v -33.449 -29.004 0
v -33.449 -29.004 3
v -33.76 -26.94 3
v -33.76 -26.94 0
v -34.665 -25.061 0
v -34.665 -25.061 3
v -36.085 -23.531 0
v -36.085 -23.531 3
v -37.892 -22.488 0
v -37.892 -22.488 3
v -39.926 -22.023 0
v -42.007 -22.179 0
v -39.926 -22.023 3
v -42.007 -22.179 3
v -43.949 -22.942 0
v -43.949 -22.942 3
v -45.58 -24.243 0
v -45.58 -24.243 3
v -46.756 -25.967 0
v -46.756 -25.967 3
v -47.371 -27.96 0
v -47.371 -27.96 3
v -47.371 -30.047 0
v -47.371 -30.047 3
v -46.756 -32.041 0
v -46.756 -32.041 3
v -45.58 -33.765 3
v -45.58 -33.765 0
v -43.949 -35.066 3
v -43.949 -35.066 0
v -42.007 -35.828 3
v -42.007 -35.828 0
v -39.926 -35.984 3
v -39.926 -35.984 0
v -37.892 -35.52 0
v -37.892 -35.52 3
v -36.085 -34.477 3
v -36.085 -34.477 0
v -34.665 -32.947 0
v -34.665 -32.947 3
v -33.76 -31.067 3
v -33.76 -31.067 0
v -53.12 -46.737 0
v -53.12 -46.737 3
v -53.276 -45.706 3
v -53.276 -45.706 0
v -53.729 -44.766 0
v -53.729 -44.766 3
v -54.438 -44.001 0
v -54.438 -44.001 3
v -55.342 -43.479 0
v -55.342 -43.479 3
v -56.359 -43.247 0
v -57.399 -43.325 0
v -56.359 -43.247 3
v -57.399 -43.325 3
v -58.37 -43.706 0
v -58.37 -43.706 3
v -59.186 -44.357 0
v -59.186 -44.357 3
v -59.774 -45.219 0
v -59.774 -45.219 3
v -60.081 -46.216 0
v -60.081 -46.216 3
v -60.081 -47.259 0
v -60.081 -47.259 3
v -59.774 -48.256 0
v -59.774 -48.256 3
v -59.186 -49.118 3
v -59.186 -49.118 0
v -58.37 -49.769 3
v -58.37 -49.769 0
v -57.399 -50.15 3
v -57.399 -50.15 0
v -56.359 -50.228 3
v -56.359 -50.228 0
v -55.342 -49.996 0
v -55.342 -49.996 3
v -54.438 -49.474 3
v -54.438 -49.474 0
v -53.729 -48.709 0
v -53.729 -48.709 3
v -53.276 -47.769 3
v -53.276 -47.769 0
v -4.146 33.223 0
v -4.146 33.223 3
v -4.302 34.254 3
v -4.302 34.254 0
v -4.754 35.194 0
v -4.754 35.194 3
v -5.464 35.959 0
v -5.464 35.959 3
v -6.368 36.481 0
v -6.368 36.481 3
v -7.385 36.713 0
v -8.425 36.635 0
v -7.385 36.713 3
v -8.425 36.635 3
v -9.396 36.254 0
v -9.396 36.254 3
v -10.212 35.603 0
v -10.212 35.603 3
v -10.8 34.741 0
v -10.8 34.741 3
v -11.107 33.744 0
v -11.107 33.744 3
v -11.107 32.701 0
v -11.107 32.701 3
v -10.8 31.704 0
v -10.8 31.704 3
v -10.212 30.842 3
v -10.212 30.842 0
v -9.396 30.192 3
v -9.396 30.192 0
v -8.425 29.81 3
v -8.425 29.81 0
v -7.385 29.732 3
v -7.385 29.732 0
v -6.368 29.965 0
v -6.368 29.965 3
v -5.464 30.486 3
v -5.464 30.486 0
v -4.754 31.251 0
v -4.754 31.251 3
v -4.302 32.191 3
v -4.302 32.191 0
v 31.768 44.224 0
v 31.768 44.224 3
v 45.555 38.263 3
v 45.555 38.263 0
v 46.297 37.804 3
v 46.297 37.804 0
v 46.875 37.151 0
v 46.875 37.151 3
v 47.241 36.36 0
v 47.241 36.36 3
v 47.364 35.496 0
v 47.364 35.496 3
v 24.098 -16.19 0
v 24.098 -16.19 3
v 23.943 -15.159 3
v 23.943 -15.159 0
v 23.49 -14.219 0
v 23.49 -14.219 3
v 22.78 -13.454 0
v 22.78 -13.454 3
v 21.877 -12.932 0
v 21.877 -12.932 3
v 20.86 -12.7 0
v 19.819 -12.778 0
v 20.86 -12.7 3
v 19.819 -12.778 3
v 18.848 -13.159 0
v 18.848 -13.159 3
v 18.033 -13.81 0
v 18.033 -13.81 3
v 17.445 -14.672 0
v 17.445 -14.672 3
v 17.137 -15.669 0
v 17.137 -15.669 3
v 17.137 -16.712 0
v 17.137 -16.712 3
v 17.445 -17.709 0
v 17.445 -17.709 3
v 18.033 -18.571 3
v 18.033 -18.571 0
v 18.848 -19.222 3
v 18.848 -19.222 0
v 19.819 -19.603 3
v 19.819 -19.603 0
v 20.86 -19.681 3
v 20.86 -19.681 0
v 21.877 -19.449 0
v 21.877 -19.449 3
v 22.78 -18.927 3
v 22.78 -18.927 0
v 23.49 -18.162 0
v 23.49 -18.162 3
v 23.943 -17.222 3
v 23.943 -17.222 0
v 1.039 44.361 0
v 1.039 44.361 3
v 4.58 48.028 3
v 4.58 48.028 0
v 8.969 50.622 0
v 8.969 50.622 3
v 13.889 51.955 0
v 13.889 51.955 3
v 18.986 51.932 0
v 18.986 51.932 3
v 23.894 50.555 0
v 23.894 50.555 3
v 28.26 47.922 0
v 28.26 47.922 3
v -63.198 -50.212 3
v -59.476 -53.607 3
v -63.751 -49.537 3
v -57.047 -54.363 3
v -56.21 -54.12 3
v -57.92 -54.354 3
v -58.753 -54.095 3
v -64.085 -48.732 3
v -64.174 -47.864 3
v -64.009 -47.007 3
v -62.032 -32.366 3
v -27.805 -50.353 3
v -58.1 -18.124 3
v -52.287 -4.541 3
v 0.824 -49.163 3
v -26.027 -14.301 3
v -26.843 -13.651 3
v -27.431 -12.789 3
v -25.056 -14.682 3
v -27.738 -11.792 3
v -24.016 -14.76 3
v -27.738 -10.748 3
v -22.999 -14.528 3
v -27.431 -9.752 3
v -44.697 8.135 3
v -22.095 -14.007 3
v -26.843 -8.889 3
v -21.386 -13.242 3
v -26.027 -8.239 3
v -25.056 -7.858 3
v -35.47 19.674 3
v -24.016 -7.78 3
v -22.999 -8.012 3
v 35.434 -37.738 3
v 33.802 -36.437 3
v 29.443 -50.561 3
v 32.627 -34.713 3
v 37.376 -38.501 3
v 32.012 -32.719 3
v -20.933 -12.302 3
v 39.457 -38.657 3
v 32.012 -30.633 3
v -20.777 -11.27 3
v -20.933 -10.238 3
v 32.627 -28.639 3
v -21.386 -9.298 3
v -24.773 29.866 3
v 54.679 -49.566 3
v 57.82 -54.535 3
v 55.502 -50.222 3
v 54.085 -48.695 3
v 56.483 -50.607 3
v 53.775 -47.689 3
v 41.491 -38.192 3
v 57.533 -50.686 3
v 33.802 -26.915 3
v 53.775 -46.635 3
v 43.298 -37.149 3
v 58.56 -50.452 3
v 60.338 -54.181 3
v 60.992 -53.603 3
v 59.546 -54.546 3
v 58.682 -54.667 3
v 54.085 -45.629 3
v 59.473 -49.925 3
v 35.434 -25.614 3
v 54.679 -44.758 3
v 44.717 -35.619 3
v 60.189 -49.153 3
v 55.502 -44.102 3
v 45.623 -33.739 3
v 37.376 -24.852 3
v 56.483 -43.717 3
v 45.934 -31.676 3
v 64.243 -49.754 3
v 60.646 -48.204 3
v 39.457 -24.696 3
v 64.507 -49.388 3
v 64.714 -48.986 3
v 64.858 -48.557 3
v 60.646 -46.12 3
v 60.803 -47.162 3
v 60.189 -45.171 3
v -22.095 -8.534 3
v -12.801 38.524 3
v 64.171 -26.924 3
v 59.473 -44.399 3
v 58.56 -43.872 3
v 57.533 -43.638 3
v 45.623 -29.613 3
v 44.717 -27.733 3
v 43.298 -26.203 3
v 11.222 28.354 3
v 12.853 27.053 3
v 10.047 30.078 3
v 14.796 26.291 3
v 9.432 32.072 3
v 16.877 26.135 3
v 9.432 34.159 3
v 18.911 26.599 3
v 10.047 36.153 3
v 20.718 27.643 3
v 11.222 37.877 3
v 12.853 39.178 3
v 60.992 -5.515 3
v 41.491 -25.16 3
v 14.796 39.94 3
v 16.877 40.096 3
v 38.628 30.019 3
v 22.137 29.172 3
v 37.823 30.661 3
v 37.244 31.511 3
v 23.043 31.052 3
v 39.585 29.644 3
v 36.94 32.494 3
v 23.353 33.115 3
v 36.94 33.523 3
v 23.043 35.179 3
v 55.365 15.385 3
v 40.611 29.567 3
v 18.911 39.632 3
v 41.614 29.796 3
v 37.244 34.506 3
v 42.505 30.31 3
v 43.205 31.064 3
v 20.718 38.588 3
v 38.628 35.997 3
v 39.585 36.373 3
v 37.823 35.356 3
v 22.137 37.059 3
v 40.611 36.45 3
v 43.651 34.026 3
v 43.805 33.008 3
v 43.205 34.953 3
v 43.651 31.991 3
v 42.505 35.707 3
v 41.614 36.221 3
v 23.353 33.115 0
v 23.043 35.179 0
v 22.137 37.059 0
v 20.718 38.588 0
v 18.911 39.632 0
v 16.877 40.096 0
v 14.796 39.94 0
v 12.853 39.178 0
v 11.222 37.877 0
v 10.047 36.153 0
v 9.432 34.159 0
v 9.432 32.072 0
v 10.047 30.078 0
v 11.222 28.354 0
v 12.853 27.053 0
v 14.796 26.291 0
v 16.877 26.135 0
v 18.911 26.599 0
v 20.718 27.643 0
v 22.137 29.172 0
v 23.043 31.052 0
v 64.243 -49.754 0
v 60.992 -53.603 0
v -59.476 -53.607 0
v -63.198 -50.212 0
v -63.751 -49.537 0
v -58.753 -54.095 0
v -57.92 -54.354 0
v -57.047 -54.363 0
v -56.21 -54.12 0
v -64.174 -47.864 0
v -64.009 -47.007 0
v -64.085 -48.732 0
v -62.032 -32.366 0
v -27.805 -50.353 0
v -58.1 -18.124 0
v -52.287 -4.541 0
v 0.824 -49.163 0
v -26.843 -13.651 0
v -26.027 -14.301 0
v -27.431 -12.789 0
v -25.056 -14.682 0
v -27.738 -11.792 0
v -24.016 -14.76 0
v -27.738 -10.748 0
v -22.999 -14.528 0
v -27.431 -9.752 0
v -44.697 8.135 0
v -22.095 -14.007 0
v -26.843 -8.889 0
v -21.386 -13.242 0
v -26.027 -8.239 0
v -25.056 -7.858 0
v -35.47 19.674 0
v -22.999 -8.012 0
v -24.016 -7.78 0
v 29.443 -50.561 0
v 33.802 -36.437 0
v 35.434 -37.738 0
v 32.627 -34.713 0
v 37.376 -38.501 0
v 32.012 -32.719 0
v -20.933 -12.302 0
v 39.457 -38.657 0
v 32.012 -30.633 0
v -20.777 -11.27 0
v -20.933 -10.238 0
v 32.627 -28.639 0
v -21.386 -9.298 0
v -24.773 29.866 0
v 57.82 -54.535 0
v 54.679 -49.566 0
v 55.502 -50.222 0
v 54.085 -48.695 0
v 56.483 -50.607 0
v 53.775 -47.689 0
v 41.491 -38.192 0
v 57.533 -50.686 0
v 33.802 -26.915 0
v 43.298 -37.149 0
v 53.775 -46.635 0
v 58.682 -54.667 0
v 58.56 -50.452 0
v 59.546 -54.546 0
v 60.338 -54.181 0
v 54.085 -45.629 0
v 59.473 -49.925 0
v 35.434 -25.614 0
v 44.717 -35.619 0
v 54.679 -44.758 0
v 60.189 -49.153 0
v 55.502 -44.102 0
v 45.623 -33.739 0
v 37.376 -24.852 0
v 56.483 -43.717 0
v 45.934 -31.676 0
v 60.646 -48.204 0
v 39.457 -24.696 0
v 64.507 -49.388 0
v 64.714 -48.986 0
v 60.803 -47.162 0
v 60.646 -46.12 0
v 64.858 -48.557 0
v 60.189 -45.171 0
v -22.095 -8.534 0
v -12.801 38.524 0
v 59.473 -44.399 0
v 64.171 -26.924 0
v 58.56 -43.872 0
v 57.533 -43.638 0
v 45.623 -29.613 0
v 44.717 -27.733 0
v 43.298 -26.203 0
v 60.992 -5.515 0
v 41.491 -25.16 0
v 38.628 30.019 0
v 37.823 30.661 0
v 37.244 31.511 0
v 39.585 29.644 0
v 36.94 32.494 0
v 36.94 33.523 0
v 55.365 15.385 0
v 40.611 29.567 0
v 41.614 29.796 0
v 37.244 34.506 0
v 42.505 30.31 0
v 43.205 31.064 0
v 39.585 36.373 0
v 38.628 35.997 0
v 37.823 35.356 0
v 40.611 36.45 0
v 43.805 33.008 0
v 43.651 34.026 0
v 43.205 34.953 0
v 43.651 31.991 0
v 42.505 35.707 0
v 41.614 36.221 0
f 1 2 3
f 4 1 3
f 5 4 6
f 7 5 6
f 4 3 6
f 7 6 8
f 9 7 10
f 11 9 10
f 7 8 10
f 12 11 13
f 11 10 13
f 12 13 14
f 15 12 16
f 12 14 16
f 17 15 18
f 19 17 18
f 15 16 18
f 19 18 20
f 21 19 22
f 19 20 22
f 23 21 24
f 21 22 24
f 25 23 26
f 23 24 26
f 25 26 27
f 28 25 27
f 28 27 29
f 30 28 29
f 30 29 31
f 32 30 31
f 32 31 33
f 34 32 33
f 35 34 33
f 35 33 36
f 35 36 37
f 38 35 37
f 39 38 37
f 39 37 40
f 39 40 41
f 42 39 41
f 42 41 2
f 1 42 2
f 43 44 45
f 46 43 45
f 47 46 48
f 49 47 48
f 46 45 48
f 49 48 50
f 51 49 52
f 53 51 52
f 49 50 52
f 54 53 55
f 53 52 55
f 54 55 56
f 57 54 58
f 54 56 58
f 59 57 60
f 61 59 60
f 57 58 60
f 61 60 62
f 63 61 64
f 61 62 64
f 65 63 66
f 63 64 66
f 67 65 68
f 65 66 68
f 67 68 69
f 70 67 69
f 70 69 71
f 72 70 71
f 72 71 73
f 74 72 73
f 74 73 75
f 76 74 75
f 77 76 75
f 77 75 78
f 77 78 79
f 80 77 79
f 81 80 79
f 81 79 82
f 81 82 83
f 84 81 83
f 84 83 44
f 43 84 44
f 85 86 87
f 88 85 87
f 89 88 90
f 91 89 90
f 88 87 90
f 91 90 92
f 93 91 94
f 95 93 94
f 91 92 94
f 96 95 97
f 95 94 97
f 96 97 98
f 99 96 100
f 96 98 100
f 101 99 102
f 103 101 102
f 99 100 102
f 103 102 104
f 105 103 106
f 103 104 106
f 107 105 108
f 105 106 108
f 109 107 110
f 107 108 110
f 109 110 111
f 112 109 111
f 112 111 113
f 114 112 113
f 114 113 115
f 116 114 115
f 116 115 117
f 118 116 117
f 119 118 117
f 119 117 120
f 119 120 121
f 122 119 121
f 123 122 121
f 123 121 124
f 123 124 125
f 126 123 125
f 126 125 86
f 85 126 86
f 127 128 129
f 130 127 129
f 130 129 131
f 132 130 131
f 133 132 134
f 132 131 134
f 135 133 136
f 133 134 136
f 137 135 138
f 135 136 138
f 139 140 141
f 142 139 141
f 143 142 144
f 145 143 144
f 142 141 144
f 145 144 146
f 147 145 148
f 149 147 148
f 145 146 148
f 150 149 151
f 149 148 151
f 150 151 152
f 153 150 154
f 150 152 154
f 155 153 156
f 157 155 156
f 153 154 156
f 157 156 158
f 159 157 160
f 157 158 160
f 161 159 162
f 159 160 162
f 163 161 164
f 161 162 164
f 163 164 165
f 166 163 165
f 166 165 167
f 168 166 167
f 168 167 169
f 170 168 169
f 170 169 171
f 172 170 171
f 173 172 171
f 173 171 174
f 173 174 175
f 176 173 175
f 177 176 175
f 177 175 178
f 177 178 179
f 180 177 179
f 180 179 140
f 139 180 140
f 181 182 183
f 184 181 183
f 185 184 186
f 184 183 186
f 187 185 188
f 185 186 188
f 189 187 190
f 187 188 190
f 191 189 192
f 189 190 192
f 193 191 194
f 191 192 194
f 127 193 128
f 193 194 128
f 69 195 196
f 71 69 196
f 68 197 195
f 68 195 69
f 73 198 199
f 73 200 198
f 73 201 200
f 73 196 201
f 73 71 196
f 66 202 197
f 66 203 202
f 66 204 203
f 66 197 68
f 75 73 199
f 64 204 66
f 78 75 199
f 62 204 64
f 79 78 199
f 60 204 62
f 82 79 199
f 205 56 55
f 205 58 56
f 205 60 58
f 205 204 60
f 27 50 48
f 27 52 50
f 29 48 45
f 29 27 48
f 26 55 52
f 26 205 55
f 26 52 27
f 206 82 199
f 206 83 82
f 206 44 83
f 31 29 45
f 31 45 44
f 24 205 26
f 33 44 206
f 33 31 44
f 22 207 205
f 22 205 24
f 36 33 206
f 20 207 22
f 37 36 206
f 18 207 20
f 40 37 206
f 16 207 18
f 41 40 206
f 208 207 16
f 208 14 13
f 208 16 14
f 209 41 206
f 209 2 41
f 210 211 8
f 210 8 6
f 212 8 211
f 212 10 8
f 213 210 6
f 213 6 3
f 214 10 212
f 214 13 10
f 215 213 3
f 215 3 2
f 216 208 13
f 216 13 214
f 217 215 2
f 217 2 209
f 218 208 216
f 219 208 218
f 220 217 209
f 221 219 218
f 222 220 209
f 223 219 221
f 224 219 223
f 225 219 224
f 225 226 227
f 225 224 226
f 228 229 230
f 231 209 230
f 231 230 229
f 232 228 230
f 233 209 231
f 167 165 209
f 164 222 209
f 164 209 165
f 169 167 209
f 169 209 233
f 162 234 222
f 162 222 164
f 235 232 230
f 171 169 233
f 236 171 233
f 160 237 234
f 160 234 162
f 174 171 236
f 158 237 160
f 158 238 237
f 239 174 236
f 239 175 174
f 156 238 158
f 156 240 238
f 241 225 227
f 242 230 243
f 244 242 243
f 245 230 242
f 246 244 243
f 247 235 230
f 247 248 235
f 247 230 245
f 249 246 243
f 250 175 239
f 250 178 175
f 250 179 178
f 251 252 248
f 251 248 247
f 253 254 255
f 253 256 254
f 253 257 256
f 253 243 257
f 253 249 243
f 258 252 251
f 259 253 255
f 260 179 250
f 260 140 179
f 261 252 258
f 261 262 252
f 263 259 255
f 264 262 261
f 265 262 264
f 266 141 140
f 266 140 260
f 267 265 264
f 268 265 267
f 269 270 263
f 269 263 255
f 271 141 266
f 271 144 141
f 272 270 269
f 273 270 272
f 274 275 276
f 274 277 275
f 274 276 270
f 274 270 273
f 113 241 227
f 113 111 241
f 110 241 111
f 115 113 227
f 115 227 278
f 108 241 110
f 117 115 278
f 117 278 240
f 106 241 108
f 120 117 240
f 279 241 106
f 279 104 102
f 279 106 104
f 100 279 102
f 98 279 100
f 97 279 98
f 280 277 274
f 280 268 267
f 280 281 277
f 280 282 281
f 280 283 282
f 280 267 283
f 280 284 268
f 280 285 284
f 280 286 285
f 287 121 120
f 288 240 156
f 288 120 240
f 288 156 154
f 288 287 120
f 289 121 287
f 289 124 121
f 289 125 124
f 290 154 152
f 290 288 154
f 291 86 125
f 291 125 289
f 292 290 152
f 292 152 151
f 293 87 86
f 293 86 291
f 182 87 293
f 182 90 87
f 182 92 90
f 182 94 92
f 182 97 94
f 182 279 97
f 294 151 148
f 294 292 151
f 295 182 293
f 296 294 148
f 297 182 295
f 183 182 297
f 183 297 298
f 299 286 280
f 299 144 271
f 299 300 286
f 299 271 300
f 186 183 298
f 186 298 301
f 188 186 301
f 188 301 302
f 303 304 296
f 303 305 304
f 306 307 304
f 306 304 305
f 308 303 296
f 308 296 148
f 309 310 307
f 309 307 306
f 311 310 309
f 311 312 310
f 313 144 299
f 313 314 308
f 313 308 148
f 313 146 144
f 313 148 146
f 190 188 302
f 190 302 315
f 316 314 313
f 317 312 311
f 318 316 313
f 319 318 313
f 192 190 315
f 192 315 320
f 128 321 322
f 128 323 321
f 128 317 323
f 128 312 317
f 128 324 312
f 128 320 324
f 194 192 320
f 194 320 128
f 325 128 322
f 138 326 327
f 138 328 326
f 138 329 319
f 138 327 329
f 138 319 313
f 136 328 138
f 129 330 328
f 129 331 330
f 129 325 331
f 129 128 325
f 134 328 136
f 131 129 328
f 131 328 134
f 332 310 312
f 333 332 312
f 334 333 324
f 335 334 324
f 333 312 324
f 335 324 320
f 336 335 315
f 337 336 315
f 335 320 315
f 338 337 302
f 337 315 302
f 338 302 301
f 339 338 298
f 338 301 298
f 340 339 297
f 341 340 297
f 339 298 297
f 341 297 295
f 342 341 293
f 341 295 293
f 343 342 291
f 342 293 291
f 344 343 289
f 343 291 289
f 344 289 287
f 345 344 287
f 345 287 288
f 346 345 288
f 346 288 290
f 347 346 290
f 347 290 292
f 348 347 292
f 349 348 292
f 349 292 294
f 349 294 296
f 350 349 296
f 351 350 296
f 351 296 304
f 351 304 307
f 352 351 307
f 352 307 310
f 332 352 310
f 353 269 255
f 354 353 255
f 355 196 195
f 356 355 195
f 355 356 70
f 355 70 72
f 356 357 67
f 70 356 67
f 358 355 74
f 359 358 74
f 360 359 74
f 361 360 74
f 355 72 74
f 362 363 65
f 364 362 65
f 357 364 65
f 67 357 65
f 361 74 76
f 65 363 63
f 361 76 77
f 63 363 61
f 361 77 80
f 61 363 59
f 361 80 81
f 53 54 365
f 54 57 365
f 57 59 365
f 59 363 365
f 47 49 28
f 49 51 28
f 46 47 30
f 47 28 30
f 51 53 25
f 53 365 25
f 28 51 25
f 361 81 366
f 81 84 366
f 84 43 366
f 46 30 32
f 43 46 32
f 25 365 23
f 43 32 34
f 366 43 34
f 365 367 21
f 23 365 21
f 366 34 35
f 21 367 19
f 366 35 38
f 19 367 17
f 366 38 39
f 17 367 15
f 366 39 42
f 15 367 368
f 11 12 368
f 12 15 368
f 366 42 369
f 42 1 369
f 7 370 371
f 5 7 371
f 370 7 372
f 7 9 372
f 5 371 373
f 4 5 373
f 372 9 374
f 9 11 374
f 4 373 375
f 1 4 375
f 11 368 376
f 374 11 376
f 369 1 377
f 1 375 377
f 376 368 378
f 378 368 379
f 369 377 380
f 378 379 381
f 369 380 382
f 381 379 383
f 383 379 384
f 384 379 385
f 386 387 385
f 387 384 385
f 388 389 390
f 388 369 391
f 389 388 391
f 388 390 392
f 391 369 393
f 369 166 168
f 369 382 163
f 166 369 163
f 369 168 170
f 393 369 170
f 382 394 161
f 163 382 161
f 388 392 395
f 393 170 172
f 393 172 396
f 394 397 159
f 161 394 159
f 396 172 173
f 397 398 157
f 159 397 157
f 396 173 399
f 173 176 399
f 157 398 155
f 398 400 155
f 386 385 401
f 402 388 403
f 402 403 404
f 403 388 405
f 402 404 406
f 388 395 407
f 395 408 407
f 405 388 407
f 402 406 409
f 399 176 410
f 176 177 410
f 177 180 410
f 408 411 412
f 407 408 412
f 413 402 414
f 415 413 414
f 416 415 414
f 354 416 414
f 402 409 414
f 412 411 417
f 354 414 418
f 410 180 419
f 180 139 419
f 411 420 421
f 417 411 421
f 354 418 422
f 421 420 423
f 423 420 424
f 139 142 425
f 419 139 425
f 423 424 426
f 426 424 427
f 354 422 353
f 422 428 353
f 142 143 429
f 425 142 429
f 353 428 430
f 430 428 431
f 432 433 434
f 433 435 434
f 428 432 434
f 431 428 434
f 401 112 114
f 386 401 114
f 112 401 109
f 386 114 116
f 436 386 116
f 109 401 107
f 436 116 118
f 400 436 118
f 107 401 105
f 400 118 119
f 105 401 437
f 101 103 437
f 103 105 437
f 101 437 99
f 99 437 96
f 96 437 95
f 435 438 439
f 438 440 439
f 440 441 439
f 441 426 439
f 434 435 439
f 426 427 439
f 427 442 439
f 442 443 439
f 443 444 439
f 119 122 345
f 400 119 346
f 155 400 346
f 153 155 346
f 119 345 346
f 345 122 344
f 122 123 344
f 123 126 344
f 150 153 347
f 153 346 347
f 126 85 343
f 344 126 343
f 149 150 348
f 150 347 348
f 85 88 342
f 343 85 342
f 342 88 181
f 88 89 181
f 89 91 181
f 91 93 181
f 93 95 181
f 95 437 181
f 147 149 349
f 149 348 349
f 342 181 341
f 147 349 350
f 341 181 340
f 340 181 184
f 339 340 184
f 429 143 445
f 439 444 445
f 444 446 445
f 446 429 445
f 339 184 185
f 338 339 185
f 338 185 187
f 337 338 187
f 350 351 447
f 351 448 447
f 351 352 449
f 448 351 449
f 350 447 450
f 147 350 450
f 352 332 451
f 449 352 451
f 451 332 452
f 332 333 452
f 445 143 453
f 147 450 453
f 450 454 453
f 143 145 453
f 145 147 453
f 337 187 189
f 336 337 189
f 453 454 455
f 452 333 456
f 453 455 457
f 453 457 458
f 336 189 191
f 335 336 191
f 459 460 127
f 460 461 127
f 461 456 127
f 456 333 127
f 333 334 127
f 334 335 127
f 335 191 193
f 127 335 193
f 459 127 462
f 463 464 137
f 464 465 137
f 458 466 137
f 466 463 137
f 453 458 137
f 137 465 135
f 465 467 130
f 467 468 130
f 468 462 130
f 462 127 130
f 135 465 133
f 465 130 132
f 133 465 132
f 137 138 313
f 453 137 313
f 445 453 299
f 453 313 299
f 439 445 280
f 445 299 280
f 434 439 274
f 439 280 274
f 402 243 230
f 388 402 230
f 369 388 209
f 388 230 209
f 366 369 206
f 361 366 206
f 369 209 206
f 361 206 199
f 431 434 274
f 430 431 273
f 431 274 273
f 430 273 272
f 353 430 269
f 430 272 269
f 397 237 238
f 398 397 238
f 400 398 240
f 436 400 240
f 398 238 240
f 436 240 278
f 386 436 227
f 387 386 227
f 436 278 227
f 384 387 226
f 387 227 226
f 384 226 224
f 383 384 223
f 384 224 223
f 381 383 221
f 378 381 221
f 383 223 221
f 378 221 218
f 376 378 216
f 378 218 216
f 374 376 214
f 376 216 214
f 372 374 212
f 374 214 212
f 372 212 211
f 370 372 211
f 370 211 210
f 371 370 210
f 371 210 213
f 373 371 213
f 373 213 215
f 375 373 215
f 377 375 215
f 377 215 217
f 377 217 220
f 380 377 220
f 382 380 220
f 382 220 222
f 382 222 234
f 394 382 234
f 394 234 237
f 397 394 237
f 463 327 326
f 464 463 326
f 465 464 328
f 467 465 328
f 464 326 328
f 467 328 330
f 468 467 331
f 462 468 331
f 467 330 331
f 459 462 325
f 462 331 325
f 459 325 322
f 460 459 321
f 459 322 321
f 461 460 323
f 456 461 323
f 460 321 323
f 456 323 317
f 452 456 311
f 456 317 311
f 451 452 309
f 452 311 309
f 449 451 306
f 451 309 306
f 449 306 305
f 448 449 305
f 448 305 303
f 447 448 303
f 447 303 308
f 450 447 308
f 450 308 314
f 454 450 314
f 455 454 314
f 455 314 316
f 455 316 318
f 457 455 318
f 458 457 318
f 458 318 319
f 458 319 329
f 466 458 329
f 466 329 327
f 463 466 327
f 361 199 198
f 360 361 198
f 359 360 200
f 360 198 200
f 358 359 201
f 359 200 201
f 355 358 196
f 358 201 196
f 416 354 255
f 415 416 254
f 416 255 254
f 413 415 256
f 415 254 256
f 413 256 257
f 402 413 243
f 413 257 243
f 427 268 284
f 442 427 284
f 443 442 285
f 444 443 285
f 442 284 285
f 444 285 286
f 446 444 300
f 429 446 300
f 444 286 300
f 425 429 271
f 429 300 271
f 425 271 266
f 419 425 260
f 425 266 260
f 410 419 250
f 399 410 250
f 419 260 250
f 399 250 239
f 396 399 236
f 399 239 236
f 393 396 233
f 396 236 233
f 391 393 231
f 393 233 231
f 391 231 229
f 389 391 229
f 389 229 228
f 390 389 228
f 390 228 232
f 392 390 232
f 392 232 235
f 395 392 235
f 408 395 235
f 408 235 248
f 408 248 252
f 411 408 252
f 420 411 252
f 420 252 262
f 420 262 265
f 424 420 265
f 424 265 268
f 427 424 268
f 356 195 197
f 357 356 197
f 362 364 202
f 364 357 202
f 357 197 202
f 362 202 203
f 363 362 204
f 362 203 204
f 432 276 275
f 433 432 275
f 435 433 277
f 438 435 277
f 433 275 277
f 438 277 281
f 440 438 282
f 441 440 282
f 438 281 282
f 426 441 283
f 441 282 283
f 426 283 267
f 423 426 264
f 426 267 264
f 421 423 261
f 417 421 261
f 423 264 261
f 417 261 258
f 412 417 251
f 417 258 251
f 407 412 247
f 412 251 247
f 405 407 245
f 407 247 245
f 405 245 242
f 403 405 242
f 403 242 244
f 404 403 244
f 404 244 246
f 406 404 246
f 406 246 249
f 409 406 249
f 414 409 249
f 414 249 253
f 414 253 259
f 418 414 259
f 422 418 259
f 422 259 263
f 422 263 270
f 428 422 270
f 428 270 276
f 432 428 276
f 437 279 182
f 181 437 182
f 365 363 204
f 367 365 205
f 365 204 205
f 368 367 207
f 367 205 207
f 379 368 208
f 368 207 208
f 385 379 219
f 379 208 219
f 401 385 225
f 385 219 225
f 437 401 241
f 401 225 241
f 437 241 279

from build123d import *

# Parameters (mm, degrees)
SKETCH1_W           = 130
SKETCH1_H           = 110
BOSS_EXTRUDE1_DEPTH = 3
SKETCH2_W           = 130
SKETCH2_H           = 110
CUT_EXTRUDE1_DEPTH  = 10
SKETCH3_R           = 7
SKETCH3_R_2         = 3.451349814
SKETCH3_R_3         = 3.5
SKETCH3_R_4         = 3.533852352
CUT_EXTRUDE2_DEPTH  = 10


with BuildPart() as part:
    # Sketch1 → Boss-Extrude1 (new body)
    with BuildSketch(Plane.XY):
        Rectangle(SKETCH1_W, SKETCH1_H)
    extrude(amount=BOSS_EXTRUDE1_DEPTH)

    # Sketch2 → Cut-Extrude1 (cut)
    with BuildSketch(Plane.XY.offset(3)):
        Rectangle(SKETCH2_W, SKETCH2_H)
        with BuildLine():
            Line((-59.47576544, -53.607140846), (-63.198422227, -50.212423413))
            ThreePointArc((-63.198422227, -50.212423413), (-64.085317487, -48.731662044), (-64.00947903, -47.007282166))
            ThreePointArc((-64.00947903, -47.007282166), (-48.705948363, 1.925420221), (-12.800867901, 38.52367989))
            Line((-12.800867901, 38.52367989), (1.038853263, 44.361019449))
            ThreePointArc((1.038853263, 44.361019449), (16.438302804, 52.115303468), (31.767912546, 44.223850371))
            Line((31.767912546, 44.223850371), (45.554969528, 38.263189769))
            ThreePointArc((45.554969528, 38.263189769), (46.875270988, 37.151415741), (47.364426614, 35.496132017))
            ThreePointArc((47.364426614, 35.496132017), (60.992088303, -5.514592593), (64.85831391, -48.556955395))
            ThreePointArc((64.85831391, -48.556955395), (64.618469123, -49.190526824), (64.242583482, -49.754129754))
            Line((64.242583482, -49.754129754), (60.991812848, -53.603125765))
            ThreePointArc((60.991812848, -53.603125765), (59.545831313, -54.545662148), (57.819814936, -54.535420134))
            ThreePointArc((57.819814936, -54.535420134), (0.823909158, -49.163408252), (-56.209622322, -54.120027458))
            ThreePointArc((-56.209622322, -54.120027458), (-57.919722192, -54.354112628), (-59.47576544, -53.607140846))
        make_face(mode=Mode.SUBTRACT)
    extrude(amount=-CUT_EXTRUDE1_DEPTH, mode=Mode.SUBTRACT)

    # Sketch3 → Cut-Extrude2 (cut)
    with BuildSketch(Plane.XY.offset(3)):
        with Locations((16.353491015, 33.115492759)):
            Circle(SKETCH3_R)
        with Locations((40.35325191, 33.008362077)):
            Circle(SKETCH3_R_2)
        with Locations((-7.64626988, 33.222623441)):
            Circle(SKETCH3_R_3)
        with Locations((-40.448942317, -29.003775794)):
            Circle(SKETCH3_R)
        with Locations((-56.620414459, -46.737458118)):
            Circle(SKETCH3_R_3)
        with Locations((-24.277470176, -11.27009347)):
            Circle(SKETCH3_R_3)
        with Locations((20.598283056, -16.190449825)):
            Circle(SKETCH3_R_3)
        with Locations((38.933809649, -31.676200197)):
            Circle(SKETCH3_R)
        with Locations((57.269336242, -47.161950568)):
            Circle(SKETCH3_R_4)
    extrude(amount=-CUT_EXTRUDE2_DEPTH, mode=Mode.SUBTRACT)


solid = part.part
